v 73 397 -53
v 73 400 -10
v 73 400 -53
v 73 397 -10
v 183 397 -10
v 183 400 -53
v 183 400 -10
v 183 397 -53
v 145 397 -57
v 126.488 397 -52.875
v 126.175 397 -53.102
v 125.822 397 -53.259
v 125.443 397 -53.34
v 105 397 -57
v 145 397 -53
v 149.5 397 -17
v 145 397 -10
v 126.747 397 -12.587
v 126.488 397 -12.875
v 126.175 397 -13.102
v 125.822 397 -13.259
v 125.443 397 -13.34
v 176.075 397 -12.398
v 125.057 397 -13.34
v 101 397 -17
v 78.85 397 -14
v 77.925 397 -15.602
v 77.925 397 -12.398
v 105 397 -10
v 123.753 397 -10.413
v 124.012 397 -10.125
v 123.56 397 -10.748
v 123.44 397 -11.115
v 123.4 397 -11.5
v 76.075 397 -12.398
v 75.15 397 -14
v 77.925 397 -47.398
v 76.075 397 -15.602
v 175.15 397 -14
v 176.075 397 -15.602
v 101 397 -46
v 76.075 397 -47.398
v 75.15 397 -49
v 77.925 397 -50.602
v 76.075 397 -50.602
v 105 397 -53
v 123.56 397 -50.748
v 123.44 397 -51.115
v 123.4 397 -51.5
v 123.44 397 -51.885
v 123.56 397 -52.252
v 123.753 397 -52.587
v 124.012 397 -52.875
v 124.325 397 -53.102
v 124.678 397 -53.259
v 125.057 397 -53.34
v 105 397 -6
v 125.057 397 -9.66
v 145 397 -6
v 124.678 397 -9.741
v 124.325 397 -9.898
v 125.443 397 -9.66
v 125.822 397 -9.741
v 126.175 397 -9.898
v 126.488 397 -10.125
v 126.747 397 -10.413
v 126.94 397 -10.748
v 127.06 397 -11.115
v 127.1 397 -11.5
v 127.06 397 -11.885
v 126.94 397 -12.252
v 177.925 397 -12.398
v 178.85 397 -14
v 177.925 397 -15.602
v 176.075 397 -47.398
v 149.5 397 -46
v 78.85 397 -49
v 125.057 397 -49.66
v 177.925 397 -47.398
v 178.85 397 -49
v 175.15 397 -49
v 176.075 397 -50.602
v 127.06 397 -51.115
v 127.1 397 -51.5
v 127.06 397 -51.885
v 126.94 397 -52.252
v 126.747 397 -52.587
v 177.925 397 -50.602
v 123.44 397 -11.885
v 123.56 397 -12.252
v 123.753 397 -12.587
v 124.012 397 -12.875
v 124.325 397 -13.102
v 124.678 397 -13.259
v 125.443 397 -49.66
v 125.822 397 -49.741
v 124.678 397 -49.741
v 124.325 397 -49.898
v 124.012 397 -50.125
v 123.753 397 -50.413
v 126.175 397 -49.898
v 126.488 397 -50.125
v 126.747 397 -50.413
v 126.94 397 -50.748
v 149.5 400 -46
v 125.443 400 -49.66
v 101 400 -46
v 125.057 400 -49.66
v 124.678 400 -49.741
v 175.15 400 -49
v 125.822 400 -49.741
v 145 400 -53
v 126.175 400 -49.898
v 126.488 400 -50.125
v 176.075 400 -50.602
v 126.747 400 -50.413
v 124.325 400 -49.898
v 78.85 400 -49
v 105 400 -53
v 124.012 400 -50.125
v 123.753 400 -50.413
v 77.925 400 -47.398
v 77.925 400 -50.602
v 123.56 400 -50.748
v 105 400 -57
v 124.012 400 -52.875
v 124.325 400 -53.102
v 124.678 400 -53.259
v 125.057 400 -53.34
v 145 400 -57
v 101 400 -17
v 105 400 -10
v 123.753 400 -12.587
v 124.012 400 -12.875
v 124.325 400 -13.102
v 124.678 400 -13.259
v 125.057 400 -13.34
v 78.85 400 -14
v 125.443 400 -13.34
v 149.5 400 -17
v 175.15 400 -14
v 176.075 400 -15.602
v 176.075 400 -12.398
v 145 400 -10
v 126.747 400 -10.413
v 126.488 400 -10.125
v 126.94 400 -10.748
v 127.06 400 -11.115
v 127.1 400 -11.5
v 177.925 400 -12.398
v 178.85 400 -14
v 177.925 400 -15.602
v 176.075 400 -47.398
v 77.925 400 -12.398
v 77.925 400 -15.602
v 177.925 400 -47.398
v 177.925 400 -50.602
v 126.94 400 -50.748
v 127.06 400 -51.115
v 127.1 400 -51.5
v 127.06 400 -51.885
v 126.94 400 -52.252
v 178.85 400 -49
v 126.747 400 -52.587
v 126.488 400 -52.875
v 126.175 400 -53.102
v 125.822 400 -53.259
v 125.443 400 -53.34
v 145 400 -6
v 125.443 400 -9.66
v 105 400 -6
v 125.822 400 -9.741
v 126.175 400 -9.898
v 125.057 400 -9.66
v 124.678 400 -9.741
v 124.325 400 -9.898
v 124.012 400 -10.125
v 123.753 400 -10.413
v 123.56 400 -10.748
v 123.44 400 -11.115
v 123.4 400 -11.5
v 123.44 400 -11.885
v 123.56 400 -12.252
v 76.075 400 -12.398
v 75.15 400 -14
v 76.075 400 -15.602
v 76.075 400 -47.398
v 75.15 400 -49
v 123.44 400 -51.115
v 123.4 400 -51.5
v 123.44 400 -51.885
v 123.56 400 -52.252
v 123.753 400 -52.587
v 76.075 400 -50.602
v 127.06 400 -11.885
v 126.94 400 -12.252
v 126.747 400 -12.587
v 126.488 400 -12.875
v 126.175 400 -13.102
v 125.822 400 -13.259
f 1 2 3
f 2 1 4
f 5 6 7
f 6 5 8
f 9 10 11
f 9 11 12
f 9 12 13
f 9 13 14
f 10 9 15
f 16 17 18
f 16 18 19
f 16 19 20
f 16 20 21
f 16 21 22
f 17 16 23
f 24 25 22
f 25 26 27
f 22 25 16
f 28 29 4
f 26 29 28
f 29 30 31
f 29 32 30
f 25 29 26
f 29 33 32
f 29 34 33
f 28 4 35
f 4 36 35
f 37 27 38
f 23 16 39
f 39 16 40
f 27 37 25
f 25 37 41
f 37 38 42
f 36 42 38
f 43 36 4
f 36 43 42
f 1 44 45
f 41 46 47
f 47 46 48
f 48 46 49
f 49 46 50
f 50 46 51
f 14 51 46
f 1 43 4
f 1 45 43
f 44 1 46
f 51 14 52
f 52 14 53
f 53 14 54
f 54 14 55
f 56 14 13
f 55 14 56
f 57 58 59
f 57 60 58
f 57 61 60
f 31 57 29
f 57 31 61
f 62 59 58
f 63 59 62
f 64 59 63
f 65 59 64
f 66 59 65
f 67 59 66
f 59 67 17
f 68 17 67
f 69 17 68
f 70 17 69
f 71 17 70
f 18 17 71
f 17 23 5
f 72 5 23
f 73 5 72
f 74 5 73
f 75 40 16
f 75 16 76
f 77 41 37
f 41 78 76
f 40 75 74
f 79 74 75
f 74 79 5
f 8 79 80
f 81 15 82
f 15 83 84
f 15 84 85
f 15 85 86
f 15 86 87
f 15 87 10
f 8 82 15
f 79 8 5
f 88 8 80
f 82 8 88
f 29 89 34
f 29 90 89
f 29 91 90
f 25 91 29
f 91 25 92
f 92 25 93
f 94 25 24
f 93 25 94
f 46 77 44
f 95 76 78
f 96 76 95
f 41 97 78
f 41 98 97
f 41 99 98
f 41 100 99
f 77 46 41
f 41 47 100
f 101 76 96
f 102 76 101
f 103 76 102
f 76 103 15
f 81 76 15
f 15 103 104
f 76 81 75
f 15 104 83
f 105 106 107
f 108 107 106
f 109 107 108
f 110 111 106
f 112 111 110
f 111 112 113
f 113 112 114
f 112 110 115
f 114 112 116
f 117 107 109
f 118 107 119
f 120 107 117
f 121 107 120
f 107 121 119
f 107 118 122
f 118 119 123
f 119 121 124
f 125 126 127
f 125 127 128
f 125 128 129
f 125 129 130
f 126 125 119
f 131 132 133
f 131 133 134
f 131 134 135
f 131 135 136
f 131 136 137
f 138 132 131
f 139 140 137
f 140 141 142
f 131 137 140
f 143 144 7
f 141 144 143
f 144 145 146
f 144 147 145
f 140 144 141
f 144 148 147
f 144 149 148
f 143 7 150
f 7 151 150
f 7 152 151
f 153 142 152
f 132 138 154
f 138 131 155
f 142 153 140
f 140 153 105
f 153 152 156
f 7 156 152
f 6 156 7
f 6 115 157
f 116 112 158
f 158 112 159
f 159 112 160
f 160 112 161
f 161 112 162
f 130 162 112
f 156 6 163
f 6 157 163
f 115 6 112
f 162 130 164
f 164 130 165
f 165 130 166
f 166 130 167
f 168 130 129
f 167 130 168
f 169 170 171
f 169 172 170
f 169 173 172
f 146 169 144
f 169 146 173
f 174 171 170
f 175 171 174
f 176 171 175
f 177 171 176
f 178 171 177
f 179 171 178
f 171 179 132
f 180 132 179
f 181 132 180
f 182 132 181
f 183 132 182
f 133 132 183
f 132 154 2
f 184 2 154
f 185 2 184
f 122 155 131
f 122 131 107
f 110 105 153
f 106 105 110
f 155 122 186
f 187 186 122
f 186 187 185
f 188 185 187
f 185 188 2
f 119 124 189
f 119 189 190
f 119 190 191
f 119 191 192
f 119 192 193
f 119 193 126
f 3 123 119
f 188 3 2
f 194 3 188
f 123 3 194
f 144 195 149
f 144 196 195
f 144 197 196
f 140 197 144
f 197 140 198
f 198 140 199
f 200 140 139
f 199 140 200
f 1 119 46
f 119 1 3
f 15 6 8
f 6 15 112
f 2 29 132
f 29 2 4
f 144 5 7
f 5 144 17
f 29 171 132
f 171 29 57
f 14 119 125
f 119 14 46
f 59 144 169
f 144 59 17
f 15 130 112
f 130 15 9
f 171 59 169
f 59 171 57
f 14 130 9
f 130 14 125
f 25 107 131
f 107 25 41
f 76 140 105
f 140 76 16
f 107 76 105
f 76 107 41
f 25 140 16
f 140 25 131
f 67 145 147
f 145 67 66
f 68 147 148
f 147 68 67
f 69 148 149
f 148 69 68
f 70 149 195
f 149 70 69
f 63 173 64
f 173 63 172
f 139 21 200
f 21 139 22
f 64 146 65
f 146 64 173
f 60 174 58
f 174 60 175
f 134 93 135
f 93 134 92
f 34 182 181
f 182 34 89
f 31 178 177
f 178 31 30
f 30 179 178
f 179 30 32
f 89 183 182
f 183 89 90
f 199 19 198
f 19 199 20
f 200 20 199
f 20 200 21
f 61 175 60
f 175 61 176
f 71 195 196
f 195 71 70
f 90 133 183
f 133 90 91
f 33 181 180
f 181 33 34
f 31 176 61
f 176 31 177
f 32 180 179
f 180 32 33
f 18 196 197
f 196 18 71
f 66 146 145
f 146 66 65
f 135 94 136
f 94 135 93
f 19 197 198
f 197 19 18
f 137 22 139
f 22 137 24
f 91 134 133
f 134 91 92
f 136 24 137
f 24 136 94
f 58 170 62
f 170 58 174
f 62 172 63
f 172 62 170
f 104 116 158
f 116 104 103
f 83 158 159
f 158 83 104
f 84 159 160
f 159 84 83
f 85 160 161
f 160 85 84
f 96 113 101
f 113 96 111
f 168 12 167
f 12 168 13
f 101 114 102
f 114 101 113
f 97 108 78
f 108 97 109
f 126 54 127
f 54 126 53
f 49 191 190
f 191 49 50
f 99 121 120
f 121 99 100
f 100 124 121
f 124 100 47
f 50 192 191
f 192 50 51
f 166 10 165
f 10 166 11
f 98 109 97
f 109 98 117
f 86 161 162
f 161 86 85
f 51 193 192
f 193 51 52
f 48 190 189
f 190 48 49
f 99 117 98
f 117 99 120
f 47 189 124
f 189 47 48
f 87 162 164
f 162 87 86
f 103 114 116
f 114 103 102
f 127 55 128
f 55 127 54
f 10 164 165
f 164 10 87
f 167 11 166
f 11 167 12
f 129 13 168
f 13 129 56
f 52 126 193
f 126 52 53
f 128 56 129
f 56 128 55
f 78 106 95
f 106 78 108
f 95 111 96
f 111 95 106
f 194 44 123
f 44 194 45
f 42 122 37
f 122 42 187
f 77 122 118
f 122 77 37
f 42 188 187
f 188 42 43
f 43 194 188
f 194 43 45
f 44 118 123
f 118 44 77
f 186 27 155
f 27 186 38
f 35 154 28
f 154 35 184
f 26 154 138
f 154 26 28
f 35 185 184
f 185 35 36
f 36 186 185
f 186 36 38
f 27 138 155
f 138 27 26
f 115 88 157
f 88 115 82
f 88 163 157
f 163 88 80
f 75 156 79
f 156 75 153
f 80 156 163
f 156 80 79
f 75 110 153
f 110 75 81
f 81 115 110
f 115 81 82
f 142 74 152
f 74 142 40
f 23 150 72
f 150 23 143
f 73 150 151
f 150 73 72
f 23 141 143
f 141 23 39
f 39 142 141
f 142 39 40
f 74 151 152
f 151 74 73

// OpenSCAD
//power5v();


//amp_powersupply_wallB_plug();


power_connect_panel();


module power5v(){
 difference(){
 cube([50,50,2]);
 translate([8,10,-0.1])cylinder(r=4.7/2,h=30,$fn=30);
 translate([8,10+28,-0.1])cylinder(r=4.7/2,h=30,$fn=30);
 translate([8+18,10+14,-0.1])cylinder(r=24.7/2,h=30,$fn=30);
 translate([8+36,10,-0.1])cylinder(r=4.7/2,h=30,$fn=30);
 }
}

module power12v(){
 difference(){
 cube([165,70,2]);
 translate([35,10,-1])cube([100,50,5]);
 translate([8,10,-0.1])cylinder(r=5.7/2,h=30,$fn=30);
 translate([8,10+50,-0.1])cylinder(r=5.7/2,h=30,$fn=30);
 translate([151,0,0]){
 translate([8,10,-0.1])#cylinder(r=5.7/2,h=30,$fn=30);
 translate([8,10+50,-0.1])cylinder(r=5.7/2,h=30,$fn=30);
 }
 }
}


module amp_powersupply_wallB_plug(){
//URBEST�Inlet Module Plug Fuse Switch Male Power Socket 10A 250V 3 Pin IEC320 C14
translate([320-192-143,15+10,-0.1-29+47-4])rotate([90,0,90])difference(){
union(){
translate([-3,-3,0])cube([(48+6),(28+6),3]);
translate([-3+54/2-4,-3-7,0])cube([(8),(8),3]);
translate([-3+54/2-4,-3+34-2,0])cube([(8),(8),3]);
}
translate([0,-0,-10])cube([(48),(28),35+5]);
translate([(48)/2,(28)/2-(39)/2,-10])cylinder(r=4.2/2,h=35);
translate([(48)/2,(28)/2+(39)/2,-10])cylinder(r=4.2/2,h=35);
}
difference(){
translate([-15,-8+20,0])cube([3,114.31+10+3+3-57,55]);
translate([320-192-143-10,15+10-0,-0.1-29+47-4-0])rotate([90,0,90])cube([(48),(28),35]);
translate([-42-110-4,5+47,30-3.5])translate([150-10+5-20,-5+10-8,-30-0.1+12])rotate([90,0,90])cylinder(r=4.2/2,h=50);
translate([-42-110-4,5+47,30-3.5+39])translate([150-10+5-20,-5+10-8,-30-0.1+12])rotate([90,0,90])cylinder(r=4.2/2,h=50);
translate([-42-110,5,30])translate([150-10+5-20,-5+10-8,-30-0.1+12])rotate([90,0,90])cylinder(r=3.7/2,h=50);
translate([-42-110,5+110.3,30])translate([150-10+5-20,-5+10-8,-30-0.1+12])rotate([90,0,90])cylinder(r=3.7/2,h=50);
translate([-42-110,5+20,30+15])rotate([-90,0,0])
translate([150-10+5-20,-5+10-8,-30-0.1+12])rotate([90,0,90])cylinder(r=3.7/2,h=50);
translate([-42-110,5+20,30+15])rotate([-90,0,0])
translate([150-10+5-20,-5+10-8,-30-0.1+12+100.5])rotate([90,0,90])cylinder(r=3.7/2,h=500);
}
}















module power_connect_panel(){
difference(){
union(){
translate([92+34-53,410-10,-53])rotate([90,0,0])cube([110,43,3]);
translate([92+34-53+32,410-10,-53-4])rotate([90,0,0])cube([40,43+8,3]);
}
#translate([92+34-53+28,410-10+1,-53+7])#rotate([90,0,0])cube([48.5,29,3+5]);
#translate([92+34-53+28+48.5/2,410-10+1,-53+7+29/2+20])#rotate([90,0,0])cylinder(r=3.7/2,h=50,$fn=30);
#translate([92+34-53+28+48.5/2,410-10+1,-53+7+29/2-20])#rotate([90,0,0])cylinder(r=3.7/2,h=50,$fn=30);


translate([92+34-53+6-2,410-10,-53+4])rotate([90,0,0])cylinder(r=3.7/2,h=30);
translate([92+34-53+6-2,410-10,-53+4+35])rotate([90,0,0])cylinder(r=3.7/2,h=30);
//translate([92+34-53+6-2+50,410-10,-53+4])rotate([90,0,0])cylinder(r=3.7/2,h=30);
//translate([92+34-53+6-2+50,410-10,-53+4+35])rotate([90,0,0])cylinder(r=3.7/2,h=30);
translate([92+34-53+6-2+100,410-10,-53+4])rotate([90,0,0])cylinder(r=3.7/2,h=30);
translate([92+34-53+6-2+100,410-10,-53+4+35])rotate([90,0,0])cylinder(r=3.7/2,h=30);
}
}
